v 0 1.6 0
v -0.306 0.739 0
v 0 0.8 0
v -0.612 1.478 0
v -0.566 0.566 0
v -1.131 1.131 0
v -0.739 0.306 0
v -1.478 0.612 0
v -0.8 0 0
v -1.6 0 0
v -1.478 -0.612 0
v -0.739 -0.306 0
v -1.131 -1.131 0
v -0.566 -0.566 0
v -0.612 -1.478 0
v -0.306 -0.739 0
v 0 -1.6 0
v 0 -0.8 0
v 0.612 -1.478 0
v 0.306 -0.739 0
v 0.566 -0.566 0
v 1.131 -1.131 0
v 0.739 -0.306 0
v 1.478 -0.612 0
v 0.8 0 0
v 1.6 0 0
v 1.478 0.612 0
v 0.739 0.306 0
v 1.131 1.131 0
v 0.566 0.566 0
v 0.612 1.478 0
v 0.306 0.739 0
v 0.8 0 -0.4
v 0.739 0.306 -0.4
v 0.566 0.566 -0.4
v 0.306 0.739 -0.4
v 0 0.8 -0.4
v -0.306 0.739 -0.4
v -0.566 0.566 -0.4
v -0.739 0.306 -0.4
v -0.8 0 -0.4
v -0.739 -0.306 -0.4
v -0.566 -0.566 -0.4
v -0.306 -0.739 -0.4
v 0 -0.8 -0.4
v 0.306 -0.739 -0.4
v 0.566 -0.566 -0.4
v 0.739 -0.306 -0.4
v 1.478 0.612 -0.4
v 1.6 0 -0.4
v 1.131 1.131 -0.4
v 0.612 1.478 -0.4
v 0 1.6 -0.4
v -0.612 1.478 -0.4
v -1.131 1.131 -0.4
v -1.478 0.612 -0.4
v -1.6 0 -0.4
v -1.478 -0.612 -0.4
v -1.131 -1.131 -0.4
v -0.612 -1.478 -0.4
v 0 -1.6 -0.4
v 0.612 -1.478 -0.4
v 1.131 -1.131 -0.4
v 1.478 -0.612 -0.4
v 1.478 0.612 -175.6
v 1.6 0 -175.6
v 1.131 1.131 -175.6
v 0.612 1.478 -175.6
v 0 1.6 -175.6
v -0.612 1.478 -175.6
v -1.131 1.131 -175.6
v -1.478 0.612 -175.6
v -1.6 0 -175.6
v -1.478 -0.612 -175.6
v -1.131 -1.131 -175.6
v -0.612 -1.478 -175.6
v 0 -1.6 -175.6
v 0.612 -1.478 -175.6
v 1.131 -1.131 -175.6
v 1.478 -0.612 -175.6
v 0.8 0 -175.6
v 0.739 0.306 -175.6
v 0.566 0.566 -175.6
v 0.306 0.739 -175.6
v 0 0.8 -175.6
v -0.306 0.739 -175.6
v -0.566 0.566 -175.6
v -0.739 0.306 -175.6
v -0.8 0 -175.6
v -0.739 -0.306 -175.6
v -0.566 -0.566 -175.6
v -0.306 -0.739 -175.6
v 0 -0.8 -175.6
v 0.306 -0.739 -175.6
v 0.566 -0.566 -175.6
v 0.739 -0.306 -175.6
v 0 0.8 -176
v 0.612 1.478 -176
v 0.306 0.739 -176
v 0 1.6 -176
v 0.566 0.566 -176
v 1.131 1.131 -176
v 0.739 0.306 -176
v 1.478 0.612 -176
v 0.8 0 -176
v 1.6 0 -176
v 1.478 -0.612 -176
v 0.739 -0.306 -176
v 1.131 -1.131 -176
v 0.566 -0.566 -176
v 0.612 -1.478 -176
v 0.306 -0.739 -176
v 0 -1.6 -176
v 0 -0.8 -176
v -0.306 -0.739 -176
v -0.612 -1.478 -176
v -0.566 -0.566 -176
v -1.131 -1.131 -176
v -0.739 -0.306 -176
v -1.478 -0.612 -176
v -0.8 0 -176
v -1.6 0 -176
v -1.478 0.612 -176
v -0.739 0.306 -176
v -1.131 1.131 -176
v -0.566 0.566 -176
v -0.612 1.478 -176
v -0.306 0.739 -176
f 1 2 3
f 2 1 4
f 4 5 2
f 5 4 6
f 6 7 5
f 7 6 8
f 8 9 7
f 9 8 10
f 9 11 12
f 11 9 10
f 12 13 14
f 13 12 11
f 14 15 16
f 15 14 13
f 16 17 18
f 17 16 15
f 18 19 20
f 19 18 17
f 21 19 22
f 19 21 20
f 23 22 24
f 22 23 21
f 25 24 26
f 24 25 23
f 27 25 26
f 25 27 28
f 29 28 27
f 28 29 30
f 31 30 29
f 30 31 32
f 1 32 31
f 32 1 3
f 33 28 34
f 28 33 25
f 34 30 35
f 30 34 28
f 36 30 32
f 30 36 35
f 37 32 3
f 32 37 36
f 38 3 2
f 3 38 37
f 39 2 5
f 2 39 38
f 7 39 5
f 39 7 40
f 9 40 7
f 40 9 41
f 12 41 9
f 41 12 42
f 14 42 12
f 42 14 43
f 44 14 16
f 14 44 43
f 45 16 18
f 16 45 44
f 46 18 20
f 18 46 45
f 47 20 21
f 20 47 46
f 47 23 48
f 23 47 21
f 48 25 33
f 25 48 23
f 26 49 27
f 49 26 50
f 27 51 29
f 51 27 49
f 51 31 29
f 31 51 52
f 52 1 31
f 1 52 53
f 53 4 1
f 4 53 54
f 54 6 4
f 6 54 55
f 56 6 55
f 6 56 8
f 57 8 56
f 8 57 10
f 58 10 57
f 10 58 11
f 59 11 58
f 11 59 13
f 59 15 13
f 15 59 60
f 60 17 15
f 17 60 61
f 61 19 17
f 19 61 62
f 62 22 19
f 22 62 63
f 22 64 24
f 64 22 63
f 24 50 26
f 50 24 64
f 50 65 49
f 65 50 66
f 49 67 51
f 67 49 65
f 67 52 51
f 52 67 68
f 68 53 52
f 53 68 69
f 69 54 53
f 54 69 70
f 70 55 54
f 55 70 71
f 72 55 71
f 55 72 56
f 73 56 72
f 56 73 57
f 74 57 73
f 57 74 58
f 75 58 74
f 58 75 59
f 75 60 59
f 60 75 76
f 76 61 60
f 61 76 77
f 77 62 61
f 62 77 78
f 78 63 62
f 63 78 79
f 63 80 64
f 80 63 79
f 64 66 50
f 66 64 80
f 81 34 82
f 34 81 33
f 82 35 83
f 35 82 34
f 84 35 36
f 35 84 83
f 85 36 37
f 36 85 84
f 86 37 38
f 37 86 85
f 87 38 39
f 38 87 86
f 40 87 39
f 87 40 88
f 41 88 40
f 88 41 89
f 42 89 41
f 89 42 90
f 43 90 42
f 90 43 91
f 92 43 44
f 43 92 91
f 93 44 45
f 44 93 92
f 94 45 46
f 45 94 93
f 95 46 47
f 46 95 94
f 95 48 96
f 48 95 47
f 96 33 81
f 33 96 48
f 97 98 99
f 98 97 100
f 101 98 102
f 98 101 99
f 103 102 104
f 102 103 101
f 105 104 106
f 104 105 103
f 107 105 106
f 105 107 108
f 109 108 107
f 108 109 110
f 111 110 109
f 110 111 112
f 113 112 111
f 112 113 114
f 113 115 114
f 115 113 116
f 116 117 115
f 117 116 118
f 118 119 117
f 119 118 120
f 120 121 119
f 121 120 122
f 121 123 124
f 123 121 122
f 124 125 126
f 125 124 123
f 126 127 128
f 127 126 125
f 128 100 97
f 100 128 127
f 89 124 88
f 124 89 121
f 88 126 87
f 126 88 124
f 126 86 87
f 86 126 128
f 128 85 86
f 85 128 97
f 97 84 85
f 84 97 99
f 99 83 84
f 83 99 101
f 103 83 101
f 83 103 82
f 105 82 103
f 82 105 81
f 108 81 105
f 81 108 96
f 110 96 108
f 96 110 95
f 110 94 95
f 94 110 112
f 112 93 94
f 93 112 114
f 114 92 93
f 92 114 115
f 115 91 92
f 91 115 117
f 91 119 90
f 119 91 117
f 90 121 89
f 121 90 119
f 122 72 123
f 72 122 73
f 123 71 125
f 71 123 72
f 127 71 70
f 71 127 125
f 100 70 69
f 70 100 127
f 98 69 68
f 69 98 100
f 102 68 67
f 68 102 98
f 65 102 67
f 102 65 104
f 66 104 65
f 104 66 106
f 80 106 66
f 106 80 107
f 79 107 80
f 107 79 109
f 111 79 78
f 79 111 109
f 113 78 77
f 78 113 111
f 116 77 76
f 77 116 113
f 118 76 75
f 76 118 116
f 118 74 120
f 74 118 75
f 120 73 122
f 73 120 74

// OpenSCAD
// file: ../p/4-4ring1.scad
use <../lib.scad>
function ldraw_lib__4_4ring1() = [
// 0 Ring  1 x 1.0
// 0 Name: 4-4ring1.dat
// 0 Author: James Jessiman
// 0 !LDRAW_ORG Primitive UPDATE 2009-01
// 0 !LICENSE Licensed under CC BY 4.0 : see CAreadme.txt
// 
// 0 BFC CERTIFY CCW
  [0,"BFC","CERTIFY"],
  [0,"BFC","CCW"],
// 
// 0 !HISTORY 1998-12-15 [PTadmin] Official Update 1998-10
// 0 !HISTORY 2002-04-08 [BrickCaster] Modified for BFC compliance
// 0 !HISTORY 2002-04-25 [PTadmin] Official Update 2002-02
// 0 !HISTORY 2007-06-24 [PTadmin] Header formatted for Contributor Agreement
// 0 !HISTORY 2008-07-01 [PTadmin] Official Update 2008-01
// 0 !HISTORY 2008-08-26 [cwdee] Switch polygon winding and rename
// 0 !HISTORY 2009-05-02 [PTadmin] Official Update 2009-01
// 
// 
// 4 16 -0.7654 0 1.8478 -0.3827 0 0.9239 0 0 1 0 0 2
  [4,16,-0.7654,0,1.8478,-0.3827,0,0.9239,0,0,1,0,0,2],
// 4 16 -1.4142 0 1.4142 -0.7071 0 0.7071 -0.3827 0 0.9239 -0.7654 0 1.8478
  [4,16,-1.4142,0,1.4142,-0.7071,0,0.7071,-0.3827,0,0.9239,-0.7654,0,1.8478],
// 4 16 -1.8478 0 0.7654 -0.9239 0 0.3827 -0.7071 0 0.7071 -1.4142 0 1.41420
  [4,16,-1.8478,0,0.7654,-0.9239,0,0.3827,-0.7071,0,0.7071,-1.4142,0,1.41420],
// 4 16 -2 0 0 -1 0 0 -0.9239 0 0.3827 -1.8478 0 0.7654
  [4,16,-2,0,0,-1,0,0,-0.9239,0,0.3827,-1.8478,0,0.7654],
// 4 16 -1.8478 0 -0.7654 -0.9239 0 -0.3827 -1 0 0 -2 0 0
  [4,16,-1.8478,0,-0.7654,-0.9239,0,-0.3827,-1,0,0,-2,0,0],
// 4 16 -1.4142 0 -1.4142 -0.7071 0 -0.7071 -0.9239 0 -0.3827 -1.8478 0 -0.7654
  [4,16,-1.4142,0,-1.4142,-0.7071,0,-0.7071,-0.9239,0,-0.3827,-1.8478,0,-0.7654],
// 4 16 -0.7654 0 -1.8478 -0.3827 0 -0.9239 -0.7071 0 -0.7071 -1.4142 0 -1.4142
  [4,16,-0.7654,0,-1.8478,-0.3827,0,-0.9239,-0.7071,0,-0.7071,-1.4142,0,-1.4142],
// 4 16 0 0 -2 0 0 -1 -0.3827 0 -0.9239 -0.7654 0 -1.8478
  [4,16,0,0,-2,0,0,-1,-0.3827,0,-0.9239,-0.7654,0,-1.8478],
// 4 16 0.7654 0 -1.8478 0.3827 0 -0.9239 0 0 -1 0 0 -2
  [4,16,0.7654,0,-1.8478,0.3827,0,-0.9239,0,0,-1,0,0,-2],
// 4 16 1.4142 0 -1.4142 0.7071 0 -0.7071 0.3827 0 -0.9239 0.7654 0 -1.8478
  [4,16,1.4142,0,-1.4142,0.7071,0,-0.7071,0.3827,0,-0.9239,0.7654,0,-1.8478],
// 4 16 1.8478 0 -0.7654 0.9239 0 -0.3827 0.7071 0 -0.7071 1.4142 0 -1.4142
  [4,16,1.8478,0,-0.7654,0.9239,0,-0.3827,0.7071,0,-0.7071,1.4142,0,-1.4142],
// 4 16 2 0 0 1 0 0 0.9239 0 -0.3827 1.8478 0 -0.7654
  [4,16,2,0,0,1,0,0,0.9239,0,-0.3827,1.8478,0,-0.7654],
// 4 16 1.8478 0 0.7654 0.9239 0 0.3827 1 0 0 2 0 0
  [4,16,1.8478,0,0.7654,0.9239,0,0.3827,1,0,0,2,0,0],
// 4 16 1.4142 0 1.4142 0.7071 0 0.7071 0.9239 0 0.3827 1.8478 0 0.7654
  [4,16,1.4142,0,1.4142,0.7071,0,0.7071,0.9239,0,0.3827,1.8478,0,0.7654],
// 4 16 0.7654 0 1.8478 0.3827 0 0.9239 0.7071 0 0.7071 1.4142 0 1.4142
  [4,16,0.7654,0,1.8478,0.3827,0,0.9239,0.7071,0,0.7071,1.4142,0,1.4142],
// 4 16 0 0 2 0 0 1 0.3827 0 0.9239 0.7654 0 1.8478
  [4,16,0,0,2,0,0,1,0.3827,0,0.9239,0.7654,0,1.8478],
// 0
];
module ldraw_lib__4_4ring1(step=0, col=false, unit=2/5, alt=false, line=0.2, solid=!$preview)
    makepoly(ldraw_lib__4_4ring1(), step=step, col=col, unit=unit, alt=alt, line=line, solid=solid);
ldraw_lib__4_4ring1(line=0.2);
// file: ../p/4-4edge.scad
use <../lib.scad>
function ldraw_lib__4_4edge() = [
// 0 Circle 1.0
// 0 Name: 4-4edge.dat
// 0 Author: James Jessiman
// 0 !LDRAW_ORG Primitive UPDATE 2017-01
// 0 !LICENSE Licensed under CC BY 4.0 : see CAreadme.txt
// 
// 0 BFC CERTIFY CCW
  [0,"BFC","CERTIFY"],
  [0,"BFC","CCW"],
// 
// 0 !HISTORY 1998-12-15 [PTadmin] Official Update 1998-10
// 0 !HISTORY 2005-12-28 [PTadmin] Official Update 2005-01
// 0 !HISTORY 2007-06-24 [PTadmin] Header formatted for Contributor Agreement
// 0 !HISTORY 2008-07-01 [PTadmin] Official Update 2008-01
// 0 !HISTORY 2017-01-15 [Steffen] BFCed
// 0 !HISTORY 2017-12-30 [PTadmin] Official Update 2017-01
// 
// 
// 2 24 1 0 0 0.9239 0 0.3827
  [2,24,1,0,0,0.9239,0,0.3827],
// 2 24 0.9239 0 0.3827 0.7071 0 0.7071
  [2,24,0.9239,0,0.3827,0.7071,0,0.7071],
// 2 24 0.7071 0 0.7071 0.3827 0 0.9239
  [2,24,0.7071,0,0.7071,0.3827,0,0.9239],
// 2 24 0.3827 0 0.9239 0 0 1
  [2,24,0.3827,0,0.9239,0,0,1],
// 2 24 0 0 1 -0.3827 0 0.9239
  [2,24,0,0,1,-0.3827,0,0.9239],
// 2 24 -0.3827 0 0.9239 -0.7071 0 0.7071
  [2,24,-0.3827,0,0.9239,-0.7071,0,0.7071],
// 2 24 -0.7071 0 0.7071 -0.9239 0 0.3827
  [2,24,-0.7071,0,0.7071,-0.9239,0,0.3827],
// 2 24 -0.9239 0 0.3827 -1 0 -0
  [2,24,-0.9239,0,0.3827,-1,0,-0],
// 2 24 -1 0 -0 -0.9239 0 -0.3827
  [2,24,-1,0,-0,-0.9239,0,-0.3827],
// 2 24 -0.9239 0 -0.3827 -0.7071 0 -0.7071
  [2,24,-0.9239,0,-0.3827,-0.7071,0,-0.7071],
// 2 24 -0.7071 0 -0.7071 -0.3827 0 -0.9239
  [2,24,-0.7071,0,-0.7071,-0.3827,0,-0.9239],
// 2 24 -0.3827 0 -0.9239 0 0 -1
  [2,24,-0.3827,0,-0.9239,0,0,-1],
// 2 24 0 0 -1 0.3827 0 -0.9239
  [2,24,0,0,-1,0.3827,0,-0.9239],
// 2 24 0.3827 0 -0.9239 0.7071 0 -0.7071
  [2,24,0.3827,0,-0.9239,0.7071,0,-0.7071],
// 2 24 0.7071 0 -0.7071 0.9239 0 -0.3827
  [2,24,0.7071,0,-0.7071,0.9239,0,-0.3827],
// 2 24 0.9239 0 -0.3827 1 0 0
  [2,24,0.9239,0,-0.3827,1,0,0],
];
module ldraw_lib__4_4edge(step=0, col=false, unit=2/5, alt=false, line=0.2, solid=!$preview)
    makepoly(ldraw_lib__4_4edge(), step=step, col=col, unit=unit, alt=alt, line=line, solid=solid);
ldraw_lib__4_4edge(line=0.2);
// file: ../p/4-4cyli.scad
use <../lib.scad>
function ldraw_lib__4_4cyli() = [
// 0 Cylinder 1.0
// 0 Name: 4-4cyli.dat
// 0 Author: James Jessiman
// 0 !LDRAW_ORG Primitive UPDATE 2005-01
// 0 !LICENSE Licensed under CC BY 4.0 : see CAreadme.txt
// 
// 0 BFC CERTIFY CCW
  [0,"BFC","CERTIFY"],
  [0,"BFC","CCW"],
// 
// 0 !HISTORY 1998-12-15 [PTadmin] Official Update 1998-10
// 0 !HISTORY 2002-03-23 [sbliss] Added BFC statement; merged headers from files in distributions LDraw 0.27 and Complete.
// 0 !HISTORY 2002-04-25 [PTadmin] Official Update 2002-02
// 0 !HISTORY 2004-12-14 [guyvivan] BFC CCW
// 0 !HISTORY 2005-12-28 [PTadmin] Official Update 2005-01
// 0 !HISTORY 2007-06-24 [PTadmin] Header formatted for Contributor Agreement
// 0 !HISTORY 2008-07-01 [PTadmin] Official Update 2008-01
// 
// 
// 4 16 1 1 0 0.9239 1 0.3827 0.9239 0 0.3827 1 0 0
  [4,16,1,1,0,0.9239,1,0.3827,0.9239,0,0.3827,1,0,0],
// 5 24 1 0 0 1 1 0 0.9239 0 0.3827 0.9239 0 -0.3827
  [5,24,1,0,0,1,1,0,0.9239,0,0.3827,0.9239,0,-0.3827],
// 4 16 0.9239 1 0.3827 0.7071 1 0.7071 0.7071 0 0.7071 0.9239 0 0.3827
  [4,16,0.9239,1,0.3827,0.7071,1,0.7071,0.7071,0,0.7071,0.9239,0,0.3827],
// 5 24 0.9239 0 0.3827 0.9239 1 0.3827 0.7071 0 0.7071 1 0 0
  [5,24,0.9239,0,0.3827,0.9239,1,0.3827,0.7071,0,0.7071,1,0,0],
// 4 16 0.7071 1 0.7071 0.3827 1 0.9239 0.3827 0 0.9239 0.7071 0 0.7071
  [4,16,0.7071,1,0.7071,0.3827,1,0.9239,0.3827,0,0.9239,0.7071,0,0.7071],
// 5 24 0.7071 0 0.7071 0.7071 1 0.7071 0.3827 0 0.9239 0.9239 0 0.3827
  [5,24,0.7071,0,0.7071,0.7071,1,0.7071,0.3827,0,0.9239,0.9239,0,0.3827],
// 4 16 0.3827 1 0.9239 0 1 1 0 0 1 0.3827 0 0.9239
  [4,16,0.3827,1,0.9239,0,1,1,0,0,1,0.3827,0,0.9239],
// 5 24 0.3827 0 0.9239 0.3827 1 0.9239 0 0 1 0.7071 0 0.7071
  [5,24,0.3827,0,0.9239,0.3827,1,0.9239,0,0,1,0.7071,0,0.7071],
// 4 16 0 1 1 -0.3827 1 0.9239 -0.3827 0 0.9239 0 0 1
  [4,16,0,1,1,-0.3827,1,0.9239,-0.3827,0,0.9239,0,0,1],
// 5 24 0 0 1 0 1 1 -0.3827 0 0.9239 0.3827 0 0.9239
  [5,24,0,0,1,0,1,1,-0.3827,0,0.9239,0.3827,0,0.9239],
// 4 16 -0.3827 1 0.9239 -0.7071 1 0.7071 -0.7071 0 0.7071 -0.3827 0 0.9239
  [4,16,-0.3827,1,0.9239,-0.7071,1,0.7071,-0.7071,0,0.7071,-0.3827,0,0.9239],
// 5 24 -0.3827 0 0.9239 -0.3827 1 0.9239 -0.7071 0 0.7071 0 0 1
  [5,24,-0.3827,0,0.9239,-0.3827,1,0.9239,-0.7071,0,0.7071,0,0,1],
// 4 16 -0.7071 1 0.7071 -0.9239 1 0.3827 -0.9239 0 0.3827 -0.7071 0 0.7071
  [4,16,-0.7071,1,0.7071,-0.9239,1,0.3827,-0.9239,0,0.3827,-0.7071,0,0.7071],
// 5 24 -0.7071 0 0.7071 -0.7071 1 0.7071 -0.9239 0 0.3827 -0.3827 0 0.9239
  [5,24,-0.7071,0,0.7071,-0.7071,1,0.7071,-0.9239,0,0.3827,-0.3827,0,0.9239],
// 4 16 -0.9239 1 0.3827 -1 1 0 -1 0 0 -0.9239 0 0.3827
  [4,16,-0.9239,1,0.3827,-1,1,0,-1,0,0,-0.9239,0,0.3827],
// 5 24 -0.9239 0 0.3827 -0.9239 1 0.3827 -1 0 0 -0.7071 0 0.7071
  [5,24,-0.9239,0,0.3827,-0.9239,1,0.3827,-1,0,0,-0.7071,0,0.7071],
// 4 16 -1 1 0 -0.9239 1 -0.3827 -0.9239 0 -0.3827 -1 0 0
  [4,16,-1,1,0,-0.9239,1,-0.3827,-0.9239,0,-0.3827,-1,0,0],
// 5 24 -1 0 0 -1 1 0 -0.9239 0 -0.3827 -0.9239 0 0.3827
  [5,24,-1,0,0,-1,1,0,-0.9239,0,-0.3827,-0.9239,0,0.3827],
// 4 16 -0.9239 1 -0.3827 -0.7071 1 -0.7071 -0.7071 0 -0.7071 -0.9239 0 -0.3827
  [4,16,-0.9239,1,-0.3827,-0.7071,1,-0.7071,-0.7071,0,-0.7071,-0.9239,0,-0.3827],
// 5 24 -0.9239 0 -0.3827 -0.9239 1 -0.3827 -0.7071 0 -0.7071 -1 0 0
  [5,24,-0.9239,0,-0.3827,-0.9239,1,-0.3827,-0.7071,0,-0.7071,-1,0,0],
// 4 16 -0.7071 1 -0.7071 -0.3827 1 -0.9239 -0.3827 0 -0.9239 -0.7071 0 -0.7071
  [4,16,-0.7071,1,-0.7071,-0.3827,1,-0.9239,-0.3827,0,-0.9239,-0.7071,0,-0.7071],
// 5 24 -0.7071 0 -0.7071 -0.7071 1 -0.7071 -0.3827 0 -0.9239 -0.9239 0 -0.3827
  [5,24,-0.7071,0,-0.7071,-0.7071,1,-0.7071,-0.3827,0,-0.9239,-0.9239,0,-0.3827],
// 4 16 -0.3827 1 -0.9239 0 1 -1 0 0 -1 -0.3827 0 -0.9239
  [4,16,-0.3827,1,-0.9239,0,1,-1,0,0,-1,-0.3827,0,-0.9239],
// 5 24 -0.3827 0 -0.9239 -0.3827 1 -0.9239 0 0 -1 -0.7071 0 -0.7071
  [5,24,-0.3827,0,-0.9239,-0.3827,1,-0.9239,0,0,-1,-0.7071,0,-0.7071],
// 4 16 0 1 -1 0.3827 1 -0.9239 0.3827 0 -0.9239 0 0 -1
  [4,16,0,1,-1,0.3827,1,-0.9239,0.3827,0,-0.9239,0,0,-1],
// 5 24 0 0 -1 0 1 -1 0.3827 0 -0.9239 -0.3827 0 -0.9239
  [5,24,0,0,-1,0,1,-1,0.3827,0,-0.9239,-0.3827,0,-0.9239],
// 4 16 0.3827 1 -0.9239 0.7071 1 -0.7071 0.7071 0 -0.7071 0.3827 0 -0.9239
  [4,16,0.3827,1,-0.9239,0.7071,1,-0.7071,0.7071,0,-0.7071,0.3827,0,-0.9239],
// 5 24 0.3827 0 -0.9239 0.3827 1 -0.9239 0.7071 0 -0.7071 0 0 -1
  [5,24,0.3827,0,-0.9239,0.3827,1,-0.9239,0.7071,0,-0.7071,0,0,-1],
// 4 16 0.7071 1 -0.7071 0.9239 1 -0.3827 0.9239 0 -0.3827 0.7071 0 -0.7071
  [4,16,0.7071,1,-0.7071,0.9239,1,-0.3827,0.9239,0,-0.3827,0.7071,0,-0.7071],
// 5 24 0.7071 0 -0.7071 0.7071 1 -0.7071 0.9239 0 -0.3827 0.3827 0 -0.9239
  [5,24,0.7071,0,-0.7071,0.7071,1,-0.7071,0.9239,0,-0.3827,0.3827,0,-0.9239],
// 4 16 0.9239 1 -0.3827 1 1 0 1 0 0 0.9239 0 -0.3827
  [4,16,0.9239,1,-0.3827,1,1,0,1,0,0,0.9239,0,-0.3827],
// 5 24 0.9239 0 -0.3827 0.9239 1 -0.3827 1 0 0 0.7071 0 -0.7071
  [5,24,0.9239,0,-0.3827,0.9239,1,-0.3827,1,0,0,0.7071,0,-0.7071],
// 0
];
module ldraw_lib__4_4cyli(step=0, col=false, unit=2/5, alt=false, line=0.2, solid=!$preview)
    makepoly(ldraw_lib__4_4cyli(), step=step, col=col, unit=unit, alt=alt, line=line, solid=solid);
ldraw_lib__4_4cyli(line=0.2);
// file: u9053.scad
use <../lib.scad>
use <../p/4-4cyli.scad>
use <../p/4-4edge.scad>
use <../p/4-4ring1.scad>
function ldraw_lib__u9053() = [
// 0 ~Technic Flex-System Hose End
// 0 Name: u9053.dat
// 0 Author: William Howard [WilliamH]
// 0 !LDRAW_ORG Part UPDATE 2011-02
// 0 !LICENSE Licensed under CC BY 2.0 and CC BY 4.0 : see CAreadme.txt
// 
// 0 BFC CERTIFY CCW
  [0,"BFC","CERTIFY"],
  [0,"BFC","CCW"],
// 
// 0 !HISTORY 2011-12-21 [cwdee] Reworked subparting technique
// 0 !HISTORY 2011-12-23 [PTadmin] Renamed from 76
// 0 !HISTORY 2011-12-29 [PTadmin] Official Update 2011-02
// 
// 
// 1 16 0 0 0 2 0 0 0 1 0 0 0 2 4-4ring1.dat
  [1,16,0,0,0,2,0,0,0,1,0,0,0,2, ldraw_lib__4_4ring1()],
// 1 16 0 0 0 2 0 0 0 1 0 0 0 2 4-4edge.dat
  [1,16,0,0,0,2,0,0,0,1,0,0,0,2, ldraw_lib__4_4edge()],
// 0 BFC INVERTNEXT
  [0,"BFC","INVERTNEXT"],
// 1 16 0 0 0 2 0 0 0 1 0 0 0 2 4-4cyli.dat
  [1,16,0,0,0,2,0,0,0,1,0,0,0,2, ldraw_lib__4_4cyli()],
// 1 16 0 0 0 4 0 0 0 1 0 0 0 4 4-4edge.dat
  [1,16,0,0,0,4,0,0,0,1,0,0,0,4, ldraw_lib__4_4edge()],
// 1 16 0 0 0 4 0 0 0 1 0 0 0 4 4-4cyli.dat
  [1,16,0,0,0,4,0,0,0,1,0,0,0,4, ldraw_lib__4_4cyli()],
// 0
];
module ldraw_lib__u9053(step=0, col=false, unit=2/5, alt=false, line=0.2, solid=!$preview)
    makepoly(ldraw_lib__u9053(), step=step, col=col, unit=unit, alt=alt, line=line, solid=solid);
ldraw_lib__u9053(line=0.2);
// file: 77.scad
use <../lib.scad>
use <../p/4-4cyli.scad>
function ldraw_lib__77() = [
// 0 ~Technic Flex-System Hose Segment
// 0 Name: 77.dat
// 0 Author: William Howard [WilliamH]
// 0 !LDRAW_ORG Part UPDATE 2011-02
// 0 !LICENSE Licensed under CC BY 2.0 and CC BY 4.0 : see CAreadme.txt
// 
// 0 BFC CERTIFY CCW
  [0,"BFC","CERTIFY"],
  [0,"BFC","CCW"],
// 
// 0 !HISTORY 2011-12-21 [cwdee] Reworked subparting technique
// 0 !HISTORY 2011-12-29 [PTadmin] Official Update 2011-02
// 
// 
// 1 16 0 0 0 4 0 0 0 1 0 0 0 4 4-4cyli.dat
  [1,16,0,0,0,4,0,0,0,1,0,0,0,4, ldraw_lib__4_4cyli()],
// 0 BFC INVERTNEXT
  [0,"BFC","INVERTNEXT"],
// 1 16 0 0 0 2 0 0 0 1 0 0 0 2 4-4cyli.dat
  [1,16,0,0,0,2,0,0,0,1,0,0,0,2, ldraw_lib__4_4cyli()],
// 0
];
module ldraw_lib__77(step=0, col=false, unit=2/5, alt=false, line=0.2, solid=!$preview)
    makepoly(ldraw_lib__77(), step=step, col=col, unit=unit, alt=alt, line=line, solid=solid);
ldraw_lib__77(line=0.2);
// main file
use <../lib.scad>
use <77.scad>
use <u9053.scad>
function ldraw_lib__76252() = [
// 0 Technic Flex-System Hose 22L (440LDU)
// 0 Name: 76252.dat
// 0 Author: Tim Gould [timgould]
// 0 !LDRAW_ORG Part UPDATE 2011-02
// 0 !LICENSE Licensed under CC BY 4.0 : see CAreadme.txt
// 
// 0 BFC CERTIFY CCW
  [0,"BFC","CERTIFY"],
  [0,"BFC","CCW"],
// 
// 0 !KEYWORDS bar, BrickLink 75c22, Rebrickable 75c22, tube
// 
// 0 !HISTORY 2011-12-29 [PTadmin] Official Update 2011-02
// 
// 
// 1 16 0 0 0 1 0 0 0 1 0 0 0 1 u9053.dat
  [1,16,0,0,0,1,0,0,0,1,0,0,0,1, ldraw_lib__u9053()],
// 1 16 0 1 0 1 0 0 0 438 0 0 0 1 77.dat
  [1,16,0,1,0,1,0,0,0,438,0,0,0,1, ldraw_lib__77()],
// 1 16 0 440 0 -1 0 0 0 -1 0 0 0 1 u9053.dat
  [1,16,0,440,0,-1,0,0,0,-1,0,0,0,1, ldraw_lib__u9053()],
];
module ldraw_lib__76252(step=0, col=false, unit=2/5, alt=false, line=0.2, solid=!$preview)
    makepoly(ldraw_lib__76252(), step=step, col=col, unit=unit, alt=alt, line=line, solid=solid);
ldraw_lib__76252(line=0.2);
